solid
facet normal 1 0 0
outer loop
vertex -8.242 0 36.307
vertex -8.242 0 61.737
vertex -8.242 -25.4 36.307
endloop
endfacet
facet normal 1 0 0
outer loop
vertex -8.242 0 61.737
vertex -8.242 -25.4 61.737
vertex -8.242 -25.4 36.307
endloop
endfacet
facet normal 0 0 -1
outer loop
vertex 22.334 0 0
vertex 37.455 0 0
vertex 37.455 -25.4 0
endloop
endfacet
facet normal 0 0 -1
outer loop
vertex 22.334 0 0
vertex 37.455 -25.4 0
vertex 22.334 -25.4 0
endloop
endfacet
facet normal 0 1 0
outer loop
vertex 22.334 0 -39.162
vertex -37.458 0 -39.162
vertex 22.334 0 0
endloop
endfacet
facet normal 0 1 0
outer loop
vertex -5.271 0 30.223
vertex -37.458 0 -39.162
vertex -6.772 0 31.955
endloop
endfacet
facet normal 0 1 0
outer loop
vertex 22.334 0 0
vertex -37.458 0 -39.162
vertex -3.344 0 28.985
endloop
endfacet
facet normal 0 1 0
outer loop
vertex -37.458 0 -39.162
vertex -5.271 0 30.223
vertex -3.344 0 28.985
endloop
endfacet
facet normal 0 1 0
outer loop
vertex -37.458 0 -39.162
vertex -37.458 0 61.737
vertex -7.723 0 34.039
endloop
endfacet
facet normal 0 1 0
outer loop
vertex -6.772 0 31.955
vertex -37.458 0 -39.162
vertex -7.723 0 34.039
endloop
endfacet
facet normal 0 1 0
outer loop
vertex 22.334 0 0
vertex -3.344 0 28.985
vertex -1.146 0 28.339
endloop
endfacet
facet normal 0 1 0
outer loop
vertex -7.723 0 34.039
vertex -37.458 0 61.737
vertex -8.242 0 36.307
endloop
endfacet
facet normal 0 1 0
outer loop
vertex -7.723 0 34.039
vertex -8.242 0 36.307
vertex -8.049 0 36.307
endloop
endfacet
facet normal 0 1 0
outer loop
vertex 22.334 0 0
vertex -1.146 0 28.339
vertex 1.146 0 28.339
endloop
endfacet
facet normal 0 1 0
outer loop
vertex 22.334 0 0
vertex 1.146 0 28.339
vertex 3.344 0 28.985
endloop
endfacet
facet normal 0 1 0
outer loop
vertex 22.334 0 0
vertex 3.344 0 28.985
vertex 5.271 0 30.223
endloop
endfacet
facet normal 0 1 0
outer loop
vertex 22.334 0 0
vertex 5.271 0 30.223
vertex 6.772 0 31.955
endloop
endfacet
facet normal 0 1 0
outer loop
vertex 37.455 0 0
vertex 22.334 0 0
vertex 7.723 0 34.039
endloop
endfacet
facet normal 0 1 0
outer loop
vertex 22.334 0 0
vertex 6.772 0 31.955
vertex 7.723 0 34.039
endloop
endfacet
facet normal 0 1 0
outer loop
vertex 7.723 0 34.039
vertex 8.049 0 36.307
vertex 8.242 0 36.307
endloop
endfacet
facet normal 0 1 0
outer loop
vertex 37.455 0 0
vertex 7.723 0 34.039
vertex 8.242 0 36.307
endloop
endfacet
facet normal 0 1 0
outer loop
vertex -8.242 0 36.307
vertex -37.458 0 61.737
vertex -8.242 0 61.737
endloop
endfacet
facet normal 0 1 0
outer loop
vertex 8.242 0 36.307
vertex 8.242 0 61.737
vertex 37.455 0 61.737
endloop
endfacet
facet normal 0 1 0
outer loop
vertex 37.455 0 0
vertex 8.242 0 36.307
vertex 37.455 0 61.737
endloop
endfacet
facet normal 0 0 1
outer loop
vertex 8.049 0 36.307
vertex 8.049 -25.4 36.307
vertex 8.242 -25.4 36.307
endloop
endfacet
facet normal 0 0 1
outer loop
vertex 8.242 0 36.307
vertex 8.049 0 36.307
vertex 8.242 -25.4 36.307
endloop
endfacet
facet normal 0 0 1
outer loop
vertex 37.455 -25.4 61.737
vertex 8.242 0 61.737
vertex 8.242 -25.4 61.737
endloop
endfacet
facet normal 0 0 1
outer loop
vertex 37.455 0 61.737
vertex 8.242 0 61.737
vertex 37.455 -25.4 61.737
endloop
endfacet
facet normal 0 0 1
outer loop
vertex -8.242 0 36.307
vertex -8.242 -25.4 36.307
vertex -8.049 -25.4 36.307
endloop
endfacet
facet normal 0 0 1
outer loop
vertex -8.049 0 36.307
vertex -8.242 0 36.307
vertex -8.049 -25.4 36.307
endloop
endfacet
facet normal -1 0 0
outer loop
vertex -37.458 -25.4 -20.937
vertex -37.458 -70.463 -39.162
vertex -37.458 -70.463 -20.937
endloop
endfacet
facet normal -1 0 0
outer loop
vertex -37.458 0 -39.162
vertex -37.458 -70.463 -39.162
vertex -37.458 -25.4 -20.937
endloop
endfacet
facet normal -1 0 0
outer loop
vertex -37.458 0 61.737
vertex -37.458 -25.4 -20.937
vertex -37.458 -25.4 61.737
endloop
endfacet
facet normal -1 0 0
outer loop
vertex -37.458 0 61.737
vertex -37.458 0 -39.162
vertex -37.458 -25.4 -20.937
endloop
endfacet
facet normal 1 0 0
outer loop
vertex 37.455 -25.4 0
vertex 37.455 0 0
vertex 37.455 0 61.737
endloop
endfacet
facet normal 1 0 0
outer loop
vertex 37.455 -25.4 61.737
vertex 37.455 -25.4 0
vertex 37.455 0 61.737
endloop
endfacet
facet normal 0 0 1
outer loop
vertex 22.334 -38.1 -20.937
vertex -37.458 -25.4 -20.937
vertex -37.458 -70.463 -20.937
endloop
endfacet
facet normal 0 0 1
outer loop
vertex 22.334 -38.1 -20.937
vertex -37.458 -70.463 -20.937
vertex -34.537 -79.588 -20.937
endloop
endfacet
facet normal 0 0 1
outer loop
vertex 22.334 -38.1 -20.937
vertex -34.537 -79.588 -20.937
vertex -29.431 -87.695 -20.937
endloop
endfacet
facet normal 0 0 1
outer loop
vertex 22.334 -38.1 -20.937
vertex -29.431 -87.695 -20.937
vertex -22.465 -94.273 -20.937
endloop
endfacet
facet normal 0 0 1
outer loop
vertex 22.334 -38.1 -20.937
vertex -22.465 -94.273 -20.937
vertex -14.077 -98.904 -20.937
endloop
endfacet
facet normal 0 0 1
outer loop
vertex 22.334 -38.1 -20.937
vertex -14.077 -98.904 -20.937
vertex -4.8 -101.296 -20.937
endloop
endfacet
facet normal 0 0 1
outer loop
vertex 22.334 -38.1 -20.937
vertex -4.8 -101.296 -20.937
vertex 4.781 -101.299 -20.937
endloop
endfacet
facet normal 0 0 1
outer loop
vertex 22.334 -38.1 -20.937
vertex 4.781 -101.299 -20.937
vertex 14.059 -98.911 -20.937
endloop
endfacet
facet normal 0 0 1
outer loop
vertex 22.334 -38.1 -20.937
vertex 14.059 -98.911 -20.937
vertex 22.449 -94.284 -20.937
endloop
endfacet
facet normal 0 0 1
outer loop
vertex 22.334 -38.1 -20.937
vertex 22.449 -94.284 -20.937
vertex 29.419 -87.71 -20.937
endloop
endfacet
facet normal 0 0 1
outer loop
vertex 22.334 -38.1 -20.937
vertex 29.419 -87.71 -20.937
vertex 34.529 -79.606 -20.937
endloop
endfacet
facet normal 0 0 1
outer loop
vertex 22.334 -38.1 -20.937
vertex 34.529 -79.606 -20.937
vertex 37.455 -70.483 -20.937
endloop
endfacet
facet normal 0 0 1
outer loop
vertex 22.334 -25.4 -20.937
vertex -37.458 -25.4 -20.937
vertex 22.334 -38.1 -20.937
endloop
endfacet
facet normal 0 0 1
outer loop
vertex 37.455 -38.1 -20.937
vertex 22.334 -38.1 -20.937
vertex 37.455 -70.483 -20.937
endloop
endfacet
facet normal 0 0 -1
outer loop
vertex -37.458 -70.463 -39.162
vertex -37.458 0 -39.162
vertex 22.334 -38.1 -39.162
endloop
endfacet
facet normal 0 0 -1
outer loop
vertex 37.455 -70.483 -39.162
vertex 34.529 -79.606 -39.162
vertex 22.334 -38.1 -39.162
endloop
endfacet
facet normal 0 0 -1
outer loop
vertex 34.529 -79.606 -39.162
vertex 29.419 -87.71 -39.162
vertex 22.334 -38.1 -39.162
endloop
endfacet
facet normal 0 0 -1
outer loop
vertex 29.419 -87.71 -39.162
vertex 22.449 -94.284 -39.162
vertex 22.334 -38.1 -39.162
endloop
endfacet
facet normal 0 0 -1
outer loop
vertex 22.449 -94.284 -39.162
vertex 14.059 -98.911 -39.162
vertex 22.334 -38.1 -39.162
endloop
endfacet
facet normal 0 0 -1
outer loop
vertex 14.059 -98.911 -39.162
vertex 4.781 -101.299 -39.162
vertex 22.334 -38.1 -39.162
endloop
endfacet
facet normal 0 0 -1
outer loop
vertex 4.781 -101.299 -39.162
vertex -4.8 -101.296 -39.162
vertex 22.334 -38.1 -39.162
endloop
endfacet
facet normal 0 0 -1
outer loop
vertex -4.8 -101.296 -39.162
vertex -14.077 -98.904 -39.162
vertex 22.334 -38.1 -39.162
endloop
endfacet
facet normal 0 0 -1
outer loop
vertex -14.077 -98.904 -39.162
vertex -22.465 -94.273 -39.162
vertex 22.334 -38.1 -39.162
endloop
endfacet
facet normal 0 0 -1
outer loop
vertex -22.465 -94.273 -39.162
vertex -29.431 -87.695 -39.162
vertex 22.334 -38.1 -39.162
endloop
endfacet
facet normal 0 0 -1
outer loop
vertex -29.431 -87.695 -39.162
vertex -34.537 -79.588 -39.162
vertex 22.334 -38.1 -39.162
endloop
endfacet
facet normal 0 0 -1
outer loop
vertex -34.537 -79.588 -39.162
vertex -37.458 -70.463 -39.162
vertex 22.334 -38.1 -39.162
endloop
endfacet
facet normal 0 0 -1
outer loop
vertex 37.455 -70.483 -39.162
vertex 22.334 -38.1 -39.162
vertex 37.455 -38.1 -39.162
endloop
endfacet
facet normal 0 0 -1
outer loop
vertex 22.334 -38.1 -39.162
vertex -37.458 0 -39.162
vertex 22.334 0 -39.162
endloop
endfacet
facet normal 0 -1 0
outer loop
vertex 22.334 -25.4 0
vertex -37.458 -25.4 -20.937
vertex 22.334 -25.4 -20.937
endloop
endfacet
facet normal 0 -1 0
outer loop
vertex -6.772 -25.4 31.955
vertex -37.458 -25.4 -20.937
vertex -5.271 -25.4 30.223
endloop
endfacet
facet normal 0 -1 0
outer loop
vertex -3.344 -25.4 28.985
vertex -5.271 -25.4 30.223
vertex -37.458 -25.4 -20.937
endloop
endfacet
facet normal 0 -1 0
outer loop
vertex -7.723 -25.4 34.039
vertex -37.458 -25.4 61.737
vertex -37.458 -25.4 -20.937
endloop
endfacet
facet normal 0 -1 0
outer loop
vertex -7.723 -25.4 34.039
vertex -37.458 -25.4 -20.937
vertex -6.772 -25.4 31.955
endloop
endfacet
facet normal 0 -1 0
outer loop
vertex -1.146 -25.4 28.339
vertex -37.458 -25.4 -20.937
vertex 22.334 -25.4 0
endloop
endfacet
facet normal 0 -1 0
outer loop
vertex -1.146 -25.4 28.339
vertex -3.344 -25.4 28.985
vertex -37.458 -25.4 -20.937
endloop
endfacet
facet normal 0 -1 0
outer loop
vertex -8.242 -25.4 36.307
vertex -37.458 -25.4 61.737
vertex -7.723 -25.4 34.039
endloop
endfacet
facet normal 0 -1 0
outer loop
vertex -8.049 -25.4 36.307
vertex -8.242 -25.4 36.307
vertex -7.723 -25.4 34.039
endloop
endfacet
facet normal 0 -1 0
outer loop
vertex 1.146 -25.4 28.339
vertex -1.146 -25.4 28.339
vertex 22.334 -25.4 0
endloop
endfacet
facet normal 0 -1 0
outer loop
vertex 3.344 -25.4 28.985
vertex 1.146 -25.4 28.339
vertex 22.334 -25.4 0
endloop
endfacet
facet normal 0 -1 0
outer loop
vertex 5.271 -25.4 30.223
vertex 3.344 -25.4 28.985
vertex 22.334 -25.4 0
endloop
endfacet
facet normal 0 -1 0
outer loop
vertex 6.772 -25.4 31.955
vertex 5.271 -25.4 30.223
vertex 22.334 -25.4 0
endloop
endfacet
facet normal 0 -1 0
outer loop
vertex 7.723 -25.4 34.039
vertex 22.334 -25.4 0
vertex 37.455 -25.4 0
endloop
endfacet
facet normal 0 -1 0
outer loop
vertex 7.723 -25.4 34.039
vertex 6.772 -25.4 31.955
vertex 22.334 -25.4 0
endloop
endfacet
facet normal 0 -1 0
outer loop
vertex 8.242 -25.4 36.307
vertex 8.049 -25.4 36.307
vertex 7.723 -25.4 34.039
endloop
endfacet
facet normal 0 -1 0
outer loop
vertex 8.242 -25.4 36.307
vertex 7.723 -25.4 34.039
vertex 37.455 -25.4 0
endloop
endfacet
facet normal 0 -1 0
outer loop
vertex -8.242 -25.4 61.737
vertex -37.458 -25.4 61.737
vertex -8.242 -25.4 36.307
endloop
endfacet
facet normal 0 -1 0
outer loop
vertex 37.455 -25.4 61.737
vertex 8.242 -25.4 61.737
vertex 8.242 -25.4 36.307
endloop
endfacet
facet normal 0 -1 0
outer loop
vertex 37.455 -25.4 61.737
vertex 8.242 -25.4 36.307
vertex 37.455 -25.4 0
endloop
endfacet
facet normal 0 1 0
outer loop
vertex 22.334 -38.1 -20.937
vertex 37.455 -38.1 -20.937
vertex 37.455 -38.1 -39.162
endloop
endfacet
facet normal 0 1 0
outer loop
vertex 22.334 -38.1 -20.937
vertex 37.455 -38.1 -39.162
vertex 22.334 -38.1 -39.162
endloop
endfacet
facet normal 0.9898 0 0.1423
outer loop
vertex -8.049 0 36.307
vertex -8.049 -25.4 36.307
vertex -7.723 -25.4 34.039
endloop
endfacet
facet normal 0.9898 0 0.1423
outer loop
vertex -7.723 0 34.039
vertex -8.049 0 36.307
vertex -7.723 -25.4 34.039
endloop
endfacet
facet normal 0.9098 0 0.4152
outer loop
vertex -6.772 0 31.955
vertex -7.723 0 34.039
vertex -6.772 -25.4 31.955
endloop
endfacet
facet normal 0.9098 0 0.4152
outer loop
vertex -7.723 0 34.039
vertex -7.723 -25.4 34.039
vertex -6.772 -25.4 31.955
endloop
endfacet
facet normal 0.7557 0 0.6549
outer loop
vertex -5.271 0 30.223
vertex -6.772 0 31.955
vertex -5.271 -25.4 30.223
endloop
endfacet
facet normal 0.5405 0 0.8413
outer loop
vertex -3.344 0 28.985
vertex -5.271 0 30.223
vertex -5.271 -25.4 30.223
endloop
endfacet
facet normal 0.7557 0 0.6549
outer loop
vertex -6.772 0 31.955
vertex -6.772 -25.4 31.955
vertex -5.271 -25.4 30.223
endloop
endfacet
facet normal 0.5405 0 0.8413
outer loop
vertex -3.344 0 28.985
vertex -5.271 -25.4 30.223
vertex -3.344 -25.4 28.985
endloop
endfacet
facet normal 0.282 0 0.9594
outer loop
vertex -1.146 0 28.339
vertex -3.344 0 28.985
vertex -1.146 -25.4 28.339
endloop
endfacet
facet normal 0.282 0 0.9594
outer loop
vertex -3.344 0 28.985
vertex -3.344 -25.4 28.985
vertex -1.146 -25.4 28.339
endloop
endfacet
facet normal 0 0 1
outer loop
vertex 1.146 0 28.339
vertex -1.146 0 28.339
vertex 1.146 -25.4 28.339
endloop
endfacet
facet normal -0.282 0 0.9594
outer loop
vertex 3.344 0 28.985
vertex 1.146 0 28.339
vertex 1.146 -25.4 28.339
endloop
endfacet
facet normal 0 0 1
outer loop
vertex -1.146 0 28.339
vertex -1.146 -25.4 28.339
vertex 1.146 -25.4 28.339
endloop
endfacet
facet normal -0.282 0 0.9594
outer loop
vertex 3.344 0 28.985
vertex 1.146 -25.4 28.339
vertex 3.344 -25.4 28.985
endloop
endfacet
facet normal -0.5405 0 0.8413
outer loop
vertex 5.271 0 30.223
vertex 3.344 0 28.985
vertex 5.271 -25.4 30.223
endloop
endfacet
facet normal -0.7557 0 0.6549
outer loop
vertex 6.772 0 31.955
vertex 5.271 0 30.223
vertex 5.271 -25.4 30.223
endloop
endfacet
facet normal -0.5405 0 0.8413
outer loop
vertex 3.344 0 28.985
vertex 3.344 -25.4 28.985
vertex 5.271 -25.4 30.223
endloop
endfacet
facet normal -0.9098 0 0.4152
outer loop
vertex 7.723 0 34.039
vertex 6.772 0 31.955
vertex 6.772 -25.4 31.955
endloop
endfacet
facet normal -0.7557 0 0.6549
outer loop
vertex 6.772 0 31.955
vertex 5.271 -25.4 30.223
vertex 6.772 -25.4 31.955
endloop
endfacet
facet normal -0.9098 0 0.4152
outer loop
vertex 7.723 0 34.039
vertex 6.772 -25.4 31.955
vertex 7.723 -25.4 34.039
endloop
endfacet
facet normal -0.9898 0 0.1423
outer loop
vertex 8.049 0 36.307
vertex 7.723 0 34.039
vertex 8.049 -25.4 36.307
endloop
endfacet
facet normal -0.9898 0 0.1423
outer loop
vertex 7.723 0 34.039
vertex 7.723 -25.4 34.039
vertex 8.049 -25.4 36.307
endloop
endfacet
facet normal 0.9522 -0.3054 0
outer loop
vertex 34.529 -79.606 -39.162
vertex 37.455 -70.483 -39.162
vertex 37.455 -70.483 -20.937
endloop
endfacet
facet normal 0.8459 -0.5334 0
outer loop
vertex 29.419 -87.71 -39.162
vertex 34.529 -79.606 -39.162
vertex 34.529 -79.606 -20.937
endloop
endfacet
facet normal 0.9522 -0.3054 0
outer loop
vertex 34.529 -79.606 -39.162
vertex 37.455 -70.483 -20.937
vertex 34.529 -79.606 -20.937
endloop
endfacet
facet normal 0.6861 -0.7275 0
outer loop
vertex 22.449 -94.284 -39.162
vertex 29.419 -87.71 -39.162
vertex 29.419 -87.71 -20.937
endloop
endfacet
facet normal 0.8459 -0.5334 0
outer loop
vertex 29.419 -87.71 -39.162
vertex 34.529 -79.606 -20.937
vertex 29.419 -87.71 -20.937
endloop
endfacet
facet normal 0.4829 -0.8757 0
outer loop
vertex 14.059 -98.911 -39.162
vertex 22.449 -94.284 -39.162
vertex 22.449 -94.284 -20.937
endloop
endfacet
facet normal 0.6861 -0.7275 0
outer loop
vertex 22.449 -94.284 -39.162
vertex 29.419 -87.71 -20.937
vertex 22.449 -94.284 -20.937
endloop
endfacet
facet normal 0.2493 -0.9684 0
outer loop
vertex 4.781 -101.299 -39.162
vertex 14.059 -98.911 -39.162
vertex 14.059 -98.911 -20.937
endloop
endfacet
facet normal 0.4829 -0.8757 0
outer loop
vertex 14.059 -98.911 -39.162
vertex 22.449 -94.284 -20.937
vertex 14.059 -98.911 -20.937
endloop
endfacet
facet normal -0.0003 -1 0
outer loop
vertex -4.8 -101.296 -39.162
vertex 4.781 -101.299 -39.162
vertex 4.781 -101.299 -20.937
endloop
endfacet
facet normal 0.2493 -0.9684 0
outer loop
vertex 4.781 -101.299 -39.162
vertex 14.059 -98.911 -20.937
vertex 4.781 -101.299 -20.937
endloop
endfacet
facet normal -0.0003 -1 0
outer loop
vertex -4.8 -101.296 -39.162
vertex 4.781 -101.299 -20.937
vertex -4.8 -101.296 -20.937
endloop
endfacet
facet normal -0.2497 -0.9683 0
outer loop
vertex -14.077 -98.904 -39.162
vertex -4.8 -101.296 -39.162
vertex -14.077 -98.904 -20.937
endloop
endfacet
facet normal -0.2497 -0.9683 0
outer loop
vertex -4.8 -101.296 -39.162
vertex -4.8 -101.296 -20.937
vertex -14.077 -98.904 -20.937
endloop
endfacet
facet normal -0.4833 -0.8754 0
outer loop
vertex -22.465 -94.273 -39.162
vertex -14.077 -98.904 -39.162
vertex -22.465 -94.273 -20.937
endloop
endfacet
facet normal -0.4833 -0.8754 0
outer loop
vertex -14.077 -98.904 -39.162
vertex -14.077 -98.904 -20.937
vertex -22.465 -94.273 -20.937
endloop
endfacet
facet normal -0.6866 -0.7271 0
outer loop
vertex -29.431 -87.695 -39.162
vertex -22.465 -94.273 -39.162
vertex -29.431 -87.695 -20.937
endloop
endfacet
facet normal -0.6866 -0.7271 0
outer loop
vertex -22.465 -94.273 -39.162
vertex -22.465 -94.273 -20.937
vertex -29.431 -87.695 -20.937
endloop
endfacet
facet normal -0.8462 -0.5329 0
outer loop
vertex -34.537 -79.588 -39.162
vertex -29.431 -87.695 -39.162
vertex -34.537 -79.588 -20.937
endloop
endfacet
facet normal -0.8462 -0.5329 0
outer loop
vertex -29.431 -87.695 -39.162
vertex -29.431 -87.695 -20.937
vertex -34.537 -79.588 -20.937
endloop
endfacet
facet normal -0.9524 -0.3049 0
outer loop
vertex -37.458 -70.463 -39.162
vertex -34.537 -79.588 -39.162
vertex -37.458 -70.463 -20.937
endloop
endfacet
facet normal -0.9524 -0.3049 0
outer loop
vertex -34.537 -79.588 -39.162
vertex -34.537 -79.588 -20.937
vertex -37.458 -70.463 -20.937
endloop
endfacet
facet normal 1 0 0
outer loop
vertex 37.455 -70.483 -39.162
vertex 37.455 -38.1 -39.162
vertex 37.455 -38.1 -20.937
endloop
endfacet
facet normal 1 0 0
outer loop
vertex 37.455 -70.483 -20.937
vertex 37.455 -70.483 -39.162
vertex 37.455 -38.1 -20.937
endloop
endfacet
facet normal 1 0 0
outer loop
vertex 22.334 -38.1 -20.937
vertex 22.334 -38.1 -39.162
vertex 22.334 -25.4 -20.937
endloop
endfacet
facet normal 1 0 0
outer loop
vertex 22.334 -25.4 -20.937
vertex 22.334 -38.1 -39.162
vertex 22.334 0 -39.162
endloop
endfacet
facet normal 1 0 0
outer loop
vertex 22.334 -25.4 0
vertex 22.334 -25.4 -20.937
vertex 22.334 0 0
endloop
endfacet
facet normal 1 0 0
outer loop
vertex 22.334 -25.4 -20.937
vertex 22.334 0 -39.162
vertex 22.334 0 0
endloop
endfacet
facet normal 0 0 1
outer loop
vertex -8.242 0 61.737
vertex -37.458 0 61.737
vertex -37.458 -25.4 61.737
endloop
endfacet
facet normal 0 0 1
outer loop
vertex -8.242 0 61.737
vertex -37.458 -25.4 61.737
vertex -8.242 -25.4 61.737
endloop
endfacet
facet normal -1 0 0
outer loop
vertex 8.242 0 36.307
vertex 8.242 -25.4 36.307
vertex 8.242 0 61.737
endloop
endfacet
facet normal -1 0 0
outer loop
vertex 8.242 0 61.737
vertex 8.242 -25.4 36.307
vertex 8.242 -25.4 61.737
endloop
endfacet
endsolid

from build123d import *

# Parameters (mm, degrees)
F0_W     = 74.9129392207
F0_H     = 89.2662387341
F0_H_2   = 11.6326007992
F1_DEPTH = 25.4
F3_DEPTH = 38.1
F4_W     = 74.9129392207
F4_H     = 18.2247254997
F5_DEPTH = 76.2
F7_DEPTH = 25.4
F8_W     = 15.1206124574
F8_H     = 39.1616150737
F9_DEPTH = 38.1


with BuildPart() as f1:
    # F0 (on Front) → F1 (new body)
    with BuildSketch(Plane.XZ):
        with Locations((-0.0017788261, 17.1041050926)):
            Rectangle(F0_W, F0_H)
        with Locations((-0.0017788261, -33.3453146741)):
            Rectangle(F0_W, F0_H_2)
    extrude(amount=F1_DEPTH)

    # F2 (on face) → F3 (cut, symmetric)
    with BuildSketch(Plane.XZ.offset(25.4)):
        with BuildLine():
            Line((8.0494598543, 36.3066755235), (8.2423314452, 36.3066755235))
            Line((8.2423314452, 36.3066755235), (8.2423314452, 87.1677733958))
            Line((8.2423314452, 87.1677733958), (-8.2423314452, 87.1677733958))
            Line((-8.2423314452, 87.1677733958), (-8.2423314452, 36.3066755235))
            Line((-8.2423314452, 36.3066755235), (-8.0494598543, 36.3066755235))
            ThreePointArc((-8.0494598543, 36.3066755235), (0, 44.3561353778), (8.0494598543, 36.3066755235))
        make_face()
        with BuildLine():
            ThreePointArc((-8.0494598543, 36.3066755235), (0, 28.2572156693), (8.0494598543, 36.3066755235))
            Line((8.0494598543, 36.3066755235), (-8.0494598543, 36.3066755235))
        make_face()
        with BuildLine():
            Line((-8.0494598543, 36.3066755235), (8.0494598543, 36.3066755235))
            ThreePointArc((8.0494598543, 36.3066755235), (0, 44.3561353778), (-8.0494598543, 36.3066755235))
        make_face()
    extrude(amount=F3_DEPTH, both=True, mode=Mode.SUBTRACT)

    # F4 (on face) → F5 (join)
    with BuildSketch(Plane.XZ.offset(25.4)):
        with Locations((-0.0017788261, -30.0492523238)):
            Rectangle(F4_W, F4_H)
    extrude(amount=F5_DEPTH)

    # F6 (on face) → F7 (cut)
    with BuildSketch(Plane.XY.offset(-20.9368895739)):
        with BuildLine():
            ThreePointArc((2.131e-07, -101.6), (-24.3546974871, -92.7994660414), (-37.4582484365, -70.4634491506))
            Line((-37.4582484365, -70.4634491506), (-37.4582484365, -101.6))
            Line((-37.4582484365, -101.6), (2.131e-07, -101.6))
        make_face()
        with BuildLine():
            ThreePointArc((37.4546907842, -70.4825595779), (24.3472225116, -92.8056778794), (2.131e-07, -101.6))
            Line((2.131e-07, -101.6), (37.4546907842, -101.6))
            Line((37.4546907842, -101.6), (37.4546907842, -70.4825595779))
        make_face()
    extrude(amount=-F7_DEPTH, mode=Mode.SUBTRACT)

    # F8 (on face) → F9 (cut)
    with BuildSketch(Plane(origin=(0, 0, 0), x_dir=(-1, 0, 0), z_dir=(0, 1, 0))):
        with Locations((-29.8943845555, -19.5808075368)):
            Rectangle(F8_W, F8_H)
    extrude(amount=-F9_DEPTH, mode=Mode.SUBTRACT)


solid = f1.part
